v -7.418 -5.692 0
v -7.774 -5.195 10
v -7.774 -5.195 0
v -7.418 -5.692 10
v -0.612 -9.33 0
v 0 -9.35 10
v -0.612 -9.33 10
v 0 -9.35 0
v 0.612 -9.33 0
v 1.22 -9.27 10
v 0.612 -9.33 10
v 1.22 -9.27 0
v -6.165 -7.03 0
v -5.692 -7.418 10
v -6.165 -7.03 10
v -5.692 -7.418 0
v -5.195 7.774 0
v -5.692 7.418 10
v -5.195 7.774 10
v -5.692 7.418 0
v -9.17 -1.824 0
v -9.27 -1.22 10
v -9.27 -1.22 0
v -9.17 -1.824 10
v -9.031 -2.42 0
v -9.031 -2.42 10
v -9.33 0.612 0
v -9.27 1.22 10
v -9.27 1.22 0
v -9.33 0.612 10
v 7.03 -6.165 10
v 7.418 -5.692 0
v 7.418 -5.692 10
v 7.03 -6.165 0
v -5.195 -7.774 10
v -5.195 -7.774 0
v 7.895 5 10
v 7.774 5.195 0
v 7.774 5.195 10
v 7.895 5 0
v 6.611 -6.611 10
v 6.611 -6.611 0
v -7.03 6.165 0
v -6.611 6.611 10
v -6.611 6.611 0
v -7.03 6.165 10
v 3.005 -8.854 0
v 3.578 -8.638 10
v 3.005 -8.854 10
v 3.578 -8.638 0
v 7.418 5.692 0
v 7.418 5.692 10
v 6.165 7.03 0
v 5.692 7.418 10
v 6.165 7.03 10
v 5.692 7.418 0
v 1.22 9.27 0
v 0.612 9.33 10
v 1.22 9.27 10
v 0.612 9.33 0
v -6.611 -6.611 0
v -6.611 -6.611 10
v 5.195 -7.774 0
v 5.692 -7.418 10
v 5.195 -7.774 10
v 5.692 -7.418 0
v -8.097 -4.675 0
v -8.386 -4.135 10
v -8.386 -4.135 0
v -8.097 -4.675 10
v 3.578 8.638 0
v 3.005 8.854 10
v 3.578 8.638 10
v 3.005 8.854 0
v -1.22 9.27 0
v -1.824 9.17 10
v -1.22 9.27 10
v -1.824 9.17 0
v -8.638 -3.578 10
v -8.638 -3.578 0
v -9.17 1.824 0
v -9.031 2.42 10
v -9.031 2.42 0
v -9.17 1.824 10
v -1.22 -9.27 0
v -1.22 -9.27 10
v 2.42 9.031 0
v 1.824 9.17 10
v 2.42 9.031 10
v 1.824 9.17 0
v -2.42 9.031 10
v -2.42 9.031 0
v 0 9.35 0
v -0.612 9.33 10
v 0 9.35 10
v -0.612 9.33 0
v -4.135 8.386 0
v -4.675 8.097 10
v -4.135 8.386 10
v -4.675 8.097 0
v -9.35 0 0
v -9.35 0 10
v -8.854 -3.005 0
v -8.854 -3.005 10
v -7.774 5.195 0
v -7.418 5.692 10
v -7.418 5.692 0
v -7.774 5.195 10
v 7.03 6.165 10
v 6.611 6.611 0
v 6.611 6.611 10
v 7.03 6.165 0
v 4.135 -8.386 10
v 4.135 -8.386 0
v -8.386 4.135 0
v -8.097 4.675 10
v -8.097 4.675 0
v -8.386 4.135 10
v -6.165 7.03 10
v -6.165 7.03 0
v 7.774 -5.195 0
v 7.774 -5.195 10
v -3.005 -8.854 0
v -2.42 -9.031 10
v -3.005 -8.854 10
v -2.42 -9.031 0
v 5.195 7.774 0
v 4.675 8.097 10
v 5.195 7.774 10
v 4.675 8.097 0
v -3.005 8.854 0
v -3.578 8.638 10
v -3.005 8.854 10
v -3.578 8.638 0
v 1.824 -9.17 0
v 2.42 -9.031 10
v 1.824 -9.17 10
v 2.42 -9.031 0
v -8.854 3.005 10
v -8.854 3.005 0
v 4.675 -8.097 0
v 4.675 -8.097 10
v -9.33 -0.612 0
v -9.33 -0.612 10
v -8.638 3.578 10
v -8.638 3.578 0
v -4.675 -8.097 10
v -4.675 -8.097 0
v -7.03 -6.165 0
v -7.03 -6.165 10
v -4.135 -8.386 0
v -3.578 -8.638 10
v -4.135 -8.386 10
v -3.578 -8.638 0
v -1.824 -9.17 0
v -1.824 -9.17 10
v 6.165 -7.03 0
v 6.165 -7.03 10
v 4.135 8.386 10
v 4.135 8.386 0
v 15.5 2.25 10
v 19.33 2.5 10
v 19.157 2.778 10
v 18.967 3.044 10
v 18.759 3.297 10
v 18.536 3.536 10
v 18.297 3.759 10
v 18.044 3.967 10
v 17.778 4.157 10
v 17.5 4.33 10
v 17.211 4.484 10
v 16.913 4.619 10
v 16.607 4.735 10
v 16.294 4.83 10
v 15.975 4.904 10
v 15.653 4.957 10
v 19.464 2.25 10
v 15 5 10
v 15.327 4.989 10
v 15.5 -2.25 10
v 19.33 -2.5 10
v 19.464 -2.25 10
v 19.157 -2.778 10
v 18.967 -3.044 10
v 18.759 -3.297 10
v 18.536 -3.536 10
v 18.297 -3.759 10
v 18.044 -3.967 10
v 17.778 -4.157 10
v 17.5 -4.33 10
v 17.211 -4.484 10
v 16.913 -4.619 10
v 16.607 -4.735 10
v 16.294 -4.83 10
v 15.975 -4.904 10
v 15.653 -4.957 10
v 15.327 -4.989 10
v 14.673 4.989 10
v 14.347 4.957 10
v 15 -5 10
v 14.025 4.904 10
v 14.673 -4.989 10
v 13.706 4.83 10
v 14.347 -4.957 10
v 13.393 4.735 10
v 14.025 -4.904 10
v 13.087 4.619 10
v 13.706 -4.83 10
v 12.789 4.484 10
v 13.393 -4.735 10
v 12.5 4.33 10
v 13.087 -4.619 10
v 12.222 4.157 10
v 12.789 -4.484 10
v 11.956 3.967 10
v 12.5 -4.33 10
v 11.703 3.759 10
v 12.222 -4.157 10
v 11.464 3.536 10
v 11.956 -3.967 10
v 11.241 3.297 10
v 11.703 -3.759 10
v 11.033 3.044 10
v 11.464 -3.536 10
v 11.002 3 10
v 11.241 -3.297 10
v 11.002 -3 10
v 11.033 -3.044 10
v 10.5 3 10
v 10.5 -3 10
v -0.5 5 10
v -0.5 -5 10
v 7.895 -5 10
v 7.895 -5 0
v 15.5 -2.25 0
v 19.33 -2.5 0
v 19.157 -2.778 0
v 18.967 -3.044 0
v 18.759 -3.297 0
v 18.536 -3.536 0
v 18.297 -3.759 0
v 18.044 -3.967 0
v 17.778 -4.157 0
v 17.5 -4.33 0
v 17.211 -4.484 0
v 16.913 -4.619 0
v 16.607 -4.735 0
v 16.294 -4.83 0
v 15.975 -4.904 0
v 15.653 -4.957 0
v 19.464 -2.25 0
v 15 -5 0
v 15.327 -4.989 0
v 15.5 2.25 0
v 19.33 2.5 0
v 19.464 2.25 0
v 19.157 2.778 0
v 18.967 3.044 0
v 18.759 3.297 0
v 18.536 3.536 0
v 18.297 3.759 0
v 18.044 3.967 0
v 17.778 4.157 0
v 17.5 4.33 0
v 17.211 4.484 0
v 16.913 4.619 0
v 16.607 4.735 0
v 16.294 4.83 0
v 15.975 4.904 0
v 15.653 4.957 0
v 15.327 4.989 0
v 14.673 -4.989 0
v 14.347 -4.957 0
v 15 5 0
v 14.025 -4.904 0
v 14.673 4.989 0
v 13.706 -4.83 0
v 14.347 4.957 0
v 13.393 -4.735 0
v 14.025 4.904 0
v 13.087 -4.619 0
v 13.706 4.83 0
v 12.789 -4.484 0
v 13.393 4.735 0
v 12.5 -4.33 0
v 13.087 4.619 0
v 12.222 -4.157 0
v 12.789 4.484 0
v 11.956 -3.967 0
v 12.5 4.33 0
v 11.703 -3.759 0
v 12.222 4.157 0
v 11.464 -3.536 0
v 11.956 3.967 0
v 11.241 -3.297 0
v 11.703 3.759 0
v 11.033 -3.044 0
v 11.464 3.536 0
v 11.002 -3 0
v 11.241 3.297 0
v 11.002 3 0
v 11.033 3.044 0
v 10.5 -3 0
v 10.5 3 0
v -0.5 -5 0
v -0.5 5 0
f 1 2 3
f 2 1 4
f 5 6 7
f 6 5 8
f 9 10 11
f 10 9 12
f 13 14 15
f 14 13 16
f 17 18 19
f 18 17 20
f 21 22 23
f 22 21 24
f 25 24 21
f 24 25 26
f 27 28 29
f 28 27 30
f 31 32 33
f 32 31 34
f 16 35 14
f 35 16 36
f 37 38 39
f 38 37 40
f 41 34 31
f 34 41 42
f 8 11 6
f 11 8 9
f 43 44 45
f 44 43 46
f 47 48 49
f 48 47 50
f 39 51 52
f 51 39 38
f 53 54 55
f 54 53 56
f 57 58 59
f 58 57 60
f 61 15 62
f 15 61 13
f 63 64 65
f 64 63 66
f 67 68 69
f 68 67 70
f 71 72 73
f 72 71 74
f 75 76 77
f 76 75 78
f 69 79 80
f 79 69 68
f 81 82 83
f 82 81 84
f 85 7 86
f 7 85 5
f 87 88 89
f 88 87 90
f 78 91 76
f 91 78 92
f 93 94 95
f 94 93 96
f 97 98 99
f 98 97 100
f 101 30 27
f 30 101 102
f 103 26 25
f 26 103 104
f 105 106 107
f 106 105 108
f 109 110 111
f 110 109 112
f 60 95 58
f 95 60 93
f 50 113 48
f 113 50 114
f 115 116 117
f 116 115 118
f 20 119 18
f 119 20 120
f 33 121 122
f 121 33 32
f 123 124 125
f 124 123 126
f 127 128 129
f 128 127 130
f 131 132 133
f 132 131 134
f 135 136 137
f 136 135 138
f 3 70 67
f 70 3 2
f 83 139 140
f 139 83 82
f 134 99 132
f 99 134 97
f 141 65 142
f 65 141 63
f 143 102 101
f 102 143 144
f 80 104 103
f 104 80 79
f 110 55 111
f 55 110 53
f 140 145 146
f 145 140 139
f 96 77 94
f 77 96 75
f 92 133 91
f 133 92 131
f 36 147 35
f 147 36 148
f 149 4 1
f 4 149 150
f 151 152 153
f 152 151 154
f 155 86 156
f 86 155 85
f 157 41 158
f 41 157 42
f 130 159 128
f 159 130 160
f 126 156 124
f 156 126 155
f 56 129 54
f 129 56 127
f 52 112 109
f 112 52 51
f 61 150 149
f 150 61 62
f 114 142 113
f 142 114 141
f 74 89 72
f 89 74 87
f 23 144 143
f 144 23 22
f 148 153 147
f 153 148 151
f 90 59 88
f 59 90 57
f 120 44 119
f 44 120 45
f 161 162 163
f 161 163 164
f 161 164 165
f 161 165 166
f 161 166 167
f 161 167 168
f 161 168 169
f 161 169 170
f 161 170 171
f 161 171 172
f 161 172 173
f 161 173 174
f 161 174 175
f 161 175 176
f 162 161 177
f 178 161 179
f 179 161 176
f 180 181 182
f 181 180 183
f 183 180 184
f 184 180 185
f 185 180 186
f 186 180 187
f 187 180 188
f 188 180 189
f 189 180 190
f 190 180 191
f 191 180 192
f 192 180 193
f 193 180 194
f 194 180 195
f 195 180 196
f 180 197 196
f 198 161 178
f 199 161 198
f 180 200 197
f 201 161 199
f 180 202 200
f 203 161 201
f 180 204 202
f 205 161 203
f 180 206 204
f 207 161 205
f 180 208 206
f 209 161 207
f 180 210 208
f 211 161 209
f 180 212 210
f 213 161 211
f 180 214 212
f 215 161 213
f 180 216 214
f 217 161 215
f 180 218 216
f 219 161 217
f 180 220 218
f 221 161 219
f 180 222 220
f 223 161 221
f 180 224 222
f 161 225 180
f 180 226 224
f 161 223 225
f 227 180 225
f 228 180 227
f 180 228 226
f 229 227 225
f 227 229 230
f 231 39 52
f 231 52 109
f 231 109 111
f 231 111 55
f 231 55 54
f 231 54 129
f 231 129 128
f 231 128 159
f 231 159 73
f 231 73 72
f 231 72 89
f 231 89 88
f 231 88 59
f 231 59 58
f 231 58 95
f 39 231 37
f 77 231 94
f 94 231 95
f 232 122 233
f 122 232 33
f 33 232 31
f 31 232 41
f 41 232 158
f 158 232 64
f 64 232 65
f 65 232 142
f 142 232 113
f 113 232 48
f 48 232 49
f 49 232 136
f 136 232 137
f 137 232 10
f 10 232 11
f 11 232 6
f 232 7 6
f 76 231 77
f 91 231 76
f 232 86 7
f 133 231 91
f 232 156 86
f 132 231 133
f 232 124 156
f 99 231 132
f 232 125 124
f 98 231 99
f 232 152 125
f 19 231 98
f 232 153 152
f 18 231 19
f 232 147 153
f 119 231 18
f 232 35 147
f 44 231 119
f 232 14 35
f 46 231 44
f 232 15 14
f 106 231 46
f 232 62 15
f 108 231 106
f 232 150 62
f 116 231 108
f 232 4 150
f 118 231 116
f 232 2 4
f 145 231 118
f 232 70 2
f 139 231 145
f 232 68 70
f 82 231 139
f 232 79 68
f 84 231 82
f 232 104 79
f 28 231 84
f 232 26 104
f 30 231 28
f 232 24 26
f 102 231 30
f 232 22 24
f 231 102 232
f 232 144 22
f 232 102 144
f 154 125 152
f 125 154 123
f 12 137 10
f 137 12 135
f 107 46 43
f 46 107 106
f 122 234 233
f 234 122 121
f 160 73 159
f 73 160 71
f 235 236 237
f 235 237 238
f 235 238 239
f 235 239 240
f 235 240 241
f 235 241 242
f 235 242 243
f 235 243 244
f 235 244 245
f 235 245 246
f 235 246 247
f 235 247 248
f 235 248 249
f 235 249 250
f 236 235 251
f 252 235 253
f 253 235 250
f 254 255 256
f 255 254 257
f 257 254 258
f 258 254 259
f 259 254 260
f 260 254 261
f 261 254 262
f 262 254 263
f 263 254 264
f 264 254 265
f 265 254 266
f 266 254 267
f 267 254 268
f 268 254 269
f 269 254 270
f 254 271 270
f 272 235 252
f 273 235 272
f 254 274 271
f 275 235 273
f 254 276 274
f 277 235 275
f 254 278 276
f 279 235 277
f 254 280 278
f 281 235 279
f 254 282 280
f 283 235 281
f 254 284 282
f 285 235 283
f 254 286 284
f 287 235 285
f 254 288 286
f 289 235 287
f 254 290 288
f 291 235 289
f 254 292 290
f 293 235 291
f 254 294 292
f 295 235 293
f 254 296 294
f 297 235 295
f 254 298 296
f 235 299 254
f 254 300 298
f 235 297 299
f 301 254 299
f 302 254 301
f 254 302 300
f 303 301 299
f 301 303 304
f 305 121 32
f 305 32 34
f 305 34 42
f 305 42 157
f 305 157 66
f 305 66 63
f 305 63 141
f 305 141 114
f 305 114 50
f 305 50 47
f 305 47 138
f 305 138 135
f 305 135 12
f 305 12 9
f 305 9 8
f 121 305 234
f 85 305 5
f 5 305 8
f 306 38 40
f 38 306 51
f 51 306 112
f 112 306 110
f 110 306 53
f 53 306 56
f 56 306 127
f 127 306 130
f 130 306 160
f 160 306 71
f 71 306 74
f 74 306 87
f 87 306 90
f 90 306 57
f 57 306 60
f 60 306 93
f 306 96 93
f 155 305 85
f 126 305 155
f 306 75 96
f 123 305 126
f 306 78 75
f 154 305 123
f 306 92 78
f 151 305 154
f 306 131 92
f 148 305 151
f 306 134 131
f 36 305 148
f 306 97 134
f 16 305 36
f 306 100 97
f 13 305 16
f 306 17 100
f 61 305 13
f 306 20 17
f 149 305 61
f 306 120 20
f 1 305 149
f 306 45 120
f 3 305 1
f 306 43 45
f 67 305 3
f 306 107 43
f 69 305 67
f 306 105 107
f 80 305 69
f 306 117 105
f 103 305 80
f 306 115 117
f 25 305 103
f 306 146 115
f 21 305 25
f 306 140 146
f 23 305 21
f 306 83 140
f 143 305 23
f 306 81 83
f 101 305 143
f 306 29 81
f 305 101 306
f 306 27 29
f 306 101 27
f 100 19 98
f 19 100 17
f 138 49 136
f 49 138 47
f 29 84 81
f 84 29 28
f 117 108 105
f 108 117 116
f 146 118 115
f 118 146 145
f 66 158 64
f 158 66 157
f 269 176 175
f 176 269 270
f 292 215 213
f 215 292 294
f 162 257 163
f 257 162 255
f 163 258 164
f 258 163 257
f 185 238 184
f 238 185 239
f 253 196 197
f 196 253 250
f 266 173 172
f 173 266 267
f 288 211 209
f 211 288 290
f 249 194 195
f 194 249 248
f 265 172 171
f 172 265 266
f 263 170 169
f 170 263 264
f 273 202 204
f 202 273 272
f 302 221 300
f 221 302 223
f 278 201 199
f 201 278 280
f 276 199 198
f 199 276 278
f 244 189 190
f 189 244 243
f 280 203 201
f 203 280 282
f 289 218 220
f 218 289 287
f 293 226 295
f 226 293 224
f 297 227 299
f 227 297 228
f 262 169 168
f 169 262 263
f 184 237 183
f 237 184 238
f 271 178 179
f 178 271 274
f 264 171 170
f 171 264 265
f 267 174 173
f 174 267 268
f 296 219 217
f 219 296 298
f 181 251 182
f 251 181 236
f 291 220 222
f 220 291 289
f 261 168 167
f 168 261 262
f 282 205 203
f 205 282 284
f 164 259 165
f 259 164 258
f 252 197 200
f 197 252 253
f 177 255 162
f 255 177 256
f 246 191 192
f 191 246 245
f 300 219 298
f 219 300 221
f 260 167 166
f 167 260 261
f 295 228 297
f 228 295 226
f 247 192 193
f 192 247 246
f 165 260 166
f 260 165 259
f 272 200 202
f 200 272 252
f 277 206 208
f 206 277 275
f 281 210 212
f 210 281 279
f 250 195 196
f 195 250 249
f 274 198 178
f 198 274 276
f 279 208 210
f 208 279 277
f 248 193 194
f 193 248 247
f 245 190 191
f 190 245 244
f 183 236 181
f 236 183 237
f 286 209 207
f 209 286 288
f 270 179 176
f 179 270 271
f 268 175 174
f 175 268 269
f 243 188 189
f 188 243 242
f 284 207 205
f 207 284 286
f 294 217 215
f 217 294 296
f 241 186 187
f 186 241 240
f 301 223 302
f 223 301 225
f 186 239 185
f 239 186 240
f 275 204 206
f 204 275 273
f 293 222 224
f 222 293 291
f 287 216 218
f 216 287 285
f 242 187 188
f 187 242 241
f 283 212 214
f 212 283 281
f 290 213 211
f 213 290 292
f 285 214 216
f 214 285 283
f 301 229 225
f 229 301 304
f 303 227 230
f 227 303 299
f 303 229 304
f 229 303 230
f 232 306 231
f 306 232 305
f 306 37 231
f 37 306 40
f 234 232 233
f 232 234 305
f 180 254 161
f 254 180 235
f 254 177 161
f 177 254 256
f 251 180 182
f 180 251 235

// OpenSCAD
// Snap-on clip that holds a piece of tubing next to a 12.7 mm (1/2 inch) lab stand rod.
// Printed flat: a 10 mm tall extrusion (Z) of a 2-D profile in the XY plane.
//
// Profile (in the XY plane):
//   1) A rod ring with 12.7 mm inner diameter and 3 mm wall (18.7 mm outer diameter),
//      centred at the origin, with a 10 mm wide opening cut out of its -X side
//      (everything with x < 0 and -5 < y < 5 is removed from this ring), so it snaps
//      onto the rod.
//   2) A tubing ring with 6 mm inner diameter and 2 mm wall, centred at x = 15, y = 0,
//      with a 4.5 mm wide opening cut out of its +X side (x > 15 and -2.25 < y < 2.25).
//   3) A solid bridge 6 mm wide (Y) between x = 8 and x = 12 that joins the two rings
//      without blocking either ring's hole.
//

$fn = 96;

// ---- Rod ring ----
rod_id     = 12.7;   // rod inner diameter
rod_wall   = 3;      // rod ring wall thickness
rod_od     = rod_id + 2 * rod_wall;  // 18.7 mm outer diameter
rod_open   = 10;     // opening width on the -X side
rod_h      = 10;     // extrusion height (Z)

// ---- Tubing ring ----
tube_id    = 6;      // tubing inner diameter
tube_wall  = 2;      // tubing ring wall thickness
tube_od    = tube_id + 2 * tube_wall; // 10 mm outer diameter
tube_x     = 15;     // tubing ring centre X
tube_open  = 4.5;    // opening width on the +X side

// ---- Bridge ----
bridge_w   = 6;      // bridge width in Y
bridge_x0  = 8;      // bridge start X
bridge_x1  = 12;     // bridge end X

// ---- Cutting overlap ----
eps        = 0.5;    // extension of cutters past faces

difference() {
    union() {
        // Rod ring
        cylinder(d = rod_od, h = rod_h);
        // Tubing ring
        translate([tube_x, 0, 0])
            cylinder(d = tube_od, h = rod_h);
        // Solid bridge
        translate([bridge_x0, -bridge_w / 2, 0])
            cube([bridge_x1 - bridge_x0, bridge_w, rod_h]);
    }
    // Rod ring opening (removes everything with x < 0 and -5 < y < 5)
    translate([-eps, -rod_open / 2, -eps])
        cube([rod_open + 2 * eps, rod_open, rod_h + 2 * eps]);
    // Tubing ring opening (removes x > 15 and -2.25 < y < 2.25)
    translate([tube_x + eps, -tube_open / 2, -eps])
        cube([rod_h + 2 * eps, tube_open, eps + rod_h + 2 * eps]);
}
